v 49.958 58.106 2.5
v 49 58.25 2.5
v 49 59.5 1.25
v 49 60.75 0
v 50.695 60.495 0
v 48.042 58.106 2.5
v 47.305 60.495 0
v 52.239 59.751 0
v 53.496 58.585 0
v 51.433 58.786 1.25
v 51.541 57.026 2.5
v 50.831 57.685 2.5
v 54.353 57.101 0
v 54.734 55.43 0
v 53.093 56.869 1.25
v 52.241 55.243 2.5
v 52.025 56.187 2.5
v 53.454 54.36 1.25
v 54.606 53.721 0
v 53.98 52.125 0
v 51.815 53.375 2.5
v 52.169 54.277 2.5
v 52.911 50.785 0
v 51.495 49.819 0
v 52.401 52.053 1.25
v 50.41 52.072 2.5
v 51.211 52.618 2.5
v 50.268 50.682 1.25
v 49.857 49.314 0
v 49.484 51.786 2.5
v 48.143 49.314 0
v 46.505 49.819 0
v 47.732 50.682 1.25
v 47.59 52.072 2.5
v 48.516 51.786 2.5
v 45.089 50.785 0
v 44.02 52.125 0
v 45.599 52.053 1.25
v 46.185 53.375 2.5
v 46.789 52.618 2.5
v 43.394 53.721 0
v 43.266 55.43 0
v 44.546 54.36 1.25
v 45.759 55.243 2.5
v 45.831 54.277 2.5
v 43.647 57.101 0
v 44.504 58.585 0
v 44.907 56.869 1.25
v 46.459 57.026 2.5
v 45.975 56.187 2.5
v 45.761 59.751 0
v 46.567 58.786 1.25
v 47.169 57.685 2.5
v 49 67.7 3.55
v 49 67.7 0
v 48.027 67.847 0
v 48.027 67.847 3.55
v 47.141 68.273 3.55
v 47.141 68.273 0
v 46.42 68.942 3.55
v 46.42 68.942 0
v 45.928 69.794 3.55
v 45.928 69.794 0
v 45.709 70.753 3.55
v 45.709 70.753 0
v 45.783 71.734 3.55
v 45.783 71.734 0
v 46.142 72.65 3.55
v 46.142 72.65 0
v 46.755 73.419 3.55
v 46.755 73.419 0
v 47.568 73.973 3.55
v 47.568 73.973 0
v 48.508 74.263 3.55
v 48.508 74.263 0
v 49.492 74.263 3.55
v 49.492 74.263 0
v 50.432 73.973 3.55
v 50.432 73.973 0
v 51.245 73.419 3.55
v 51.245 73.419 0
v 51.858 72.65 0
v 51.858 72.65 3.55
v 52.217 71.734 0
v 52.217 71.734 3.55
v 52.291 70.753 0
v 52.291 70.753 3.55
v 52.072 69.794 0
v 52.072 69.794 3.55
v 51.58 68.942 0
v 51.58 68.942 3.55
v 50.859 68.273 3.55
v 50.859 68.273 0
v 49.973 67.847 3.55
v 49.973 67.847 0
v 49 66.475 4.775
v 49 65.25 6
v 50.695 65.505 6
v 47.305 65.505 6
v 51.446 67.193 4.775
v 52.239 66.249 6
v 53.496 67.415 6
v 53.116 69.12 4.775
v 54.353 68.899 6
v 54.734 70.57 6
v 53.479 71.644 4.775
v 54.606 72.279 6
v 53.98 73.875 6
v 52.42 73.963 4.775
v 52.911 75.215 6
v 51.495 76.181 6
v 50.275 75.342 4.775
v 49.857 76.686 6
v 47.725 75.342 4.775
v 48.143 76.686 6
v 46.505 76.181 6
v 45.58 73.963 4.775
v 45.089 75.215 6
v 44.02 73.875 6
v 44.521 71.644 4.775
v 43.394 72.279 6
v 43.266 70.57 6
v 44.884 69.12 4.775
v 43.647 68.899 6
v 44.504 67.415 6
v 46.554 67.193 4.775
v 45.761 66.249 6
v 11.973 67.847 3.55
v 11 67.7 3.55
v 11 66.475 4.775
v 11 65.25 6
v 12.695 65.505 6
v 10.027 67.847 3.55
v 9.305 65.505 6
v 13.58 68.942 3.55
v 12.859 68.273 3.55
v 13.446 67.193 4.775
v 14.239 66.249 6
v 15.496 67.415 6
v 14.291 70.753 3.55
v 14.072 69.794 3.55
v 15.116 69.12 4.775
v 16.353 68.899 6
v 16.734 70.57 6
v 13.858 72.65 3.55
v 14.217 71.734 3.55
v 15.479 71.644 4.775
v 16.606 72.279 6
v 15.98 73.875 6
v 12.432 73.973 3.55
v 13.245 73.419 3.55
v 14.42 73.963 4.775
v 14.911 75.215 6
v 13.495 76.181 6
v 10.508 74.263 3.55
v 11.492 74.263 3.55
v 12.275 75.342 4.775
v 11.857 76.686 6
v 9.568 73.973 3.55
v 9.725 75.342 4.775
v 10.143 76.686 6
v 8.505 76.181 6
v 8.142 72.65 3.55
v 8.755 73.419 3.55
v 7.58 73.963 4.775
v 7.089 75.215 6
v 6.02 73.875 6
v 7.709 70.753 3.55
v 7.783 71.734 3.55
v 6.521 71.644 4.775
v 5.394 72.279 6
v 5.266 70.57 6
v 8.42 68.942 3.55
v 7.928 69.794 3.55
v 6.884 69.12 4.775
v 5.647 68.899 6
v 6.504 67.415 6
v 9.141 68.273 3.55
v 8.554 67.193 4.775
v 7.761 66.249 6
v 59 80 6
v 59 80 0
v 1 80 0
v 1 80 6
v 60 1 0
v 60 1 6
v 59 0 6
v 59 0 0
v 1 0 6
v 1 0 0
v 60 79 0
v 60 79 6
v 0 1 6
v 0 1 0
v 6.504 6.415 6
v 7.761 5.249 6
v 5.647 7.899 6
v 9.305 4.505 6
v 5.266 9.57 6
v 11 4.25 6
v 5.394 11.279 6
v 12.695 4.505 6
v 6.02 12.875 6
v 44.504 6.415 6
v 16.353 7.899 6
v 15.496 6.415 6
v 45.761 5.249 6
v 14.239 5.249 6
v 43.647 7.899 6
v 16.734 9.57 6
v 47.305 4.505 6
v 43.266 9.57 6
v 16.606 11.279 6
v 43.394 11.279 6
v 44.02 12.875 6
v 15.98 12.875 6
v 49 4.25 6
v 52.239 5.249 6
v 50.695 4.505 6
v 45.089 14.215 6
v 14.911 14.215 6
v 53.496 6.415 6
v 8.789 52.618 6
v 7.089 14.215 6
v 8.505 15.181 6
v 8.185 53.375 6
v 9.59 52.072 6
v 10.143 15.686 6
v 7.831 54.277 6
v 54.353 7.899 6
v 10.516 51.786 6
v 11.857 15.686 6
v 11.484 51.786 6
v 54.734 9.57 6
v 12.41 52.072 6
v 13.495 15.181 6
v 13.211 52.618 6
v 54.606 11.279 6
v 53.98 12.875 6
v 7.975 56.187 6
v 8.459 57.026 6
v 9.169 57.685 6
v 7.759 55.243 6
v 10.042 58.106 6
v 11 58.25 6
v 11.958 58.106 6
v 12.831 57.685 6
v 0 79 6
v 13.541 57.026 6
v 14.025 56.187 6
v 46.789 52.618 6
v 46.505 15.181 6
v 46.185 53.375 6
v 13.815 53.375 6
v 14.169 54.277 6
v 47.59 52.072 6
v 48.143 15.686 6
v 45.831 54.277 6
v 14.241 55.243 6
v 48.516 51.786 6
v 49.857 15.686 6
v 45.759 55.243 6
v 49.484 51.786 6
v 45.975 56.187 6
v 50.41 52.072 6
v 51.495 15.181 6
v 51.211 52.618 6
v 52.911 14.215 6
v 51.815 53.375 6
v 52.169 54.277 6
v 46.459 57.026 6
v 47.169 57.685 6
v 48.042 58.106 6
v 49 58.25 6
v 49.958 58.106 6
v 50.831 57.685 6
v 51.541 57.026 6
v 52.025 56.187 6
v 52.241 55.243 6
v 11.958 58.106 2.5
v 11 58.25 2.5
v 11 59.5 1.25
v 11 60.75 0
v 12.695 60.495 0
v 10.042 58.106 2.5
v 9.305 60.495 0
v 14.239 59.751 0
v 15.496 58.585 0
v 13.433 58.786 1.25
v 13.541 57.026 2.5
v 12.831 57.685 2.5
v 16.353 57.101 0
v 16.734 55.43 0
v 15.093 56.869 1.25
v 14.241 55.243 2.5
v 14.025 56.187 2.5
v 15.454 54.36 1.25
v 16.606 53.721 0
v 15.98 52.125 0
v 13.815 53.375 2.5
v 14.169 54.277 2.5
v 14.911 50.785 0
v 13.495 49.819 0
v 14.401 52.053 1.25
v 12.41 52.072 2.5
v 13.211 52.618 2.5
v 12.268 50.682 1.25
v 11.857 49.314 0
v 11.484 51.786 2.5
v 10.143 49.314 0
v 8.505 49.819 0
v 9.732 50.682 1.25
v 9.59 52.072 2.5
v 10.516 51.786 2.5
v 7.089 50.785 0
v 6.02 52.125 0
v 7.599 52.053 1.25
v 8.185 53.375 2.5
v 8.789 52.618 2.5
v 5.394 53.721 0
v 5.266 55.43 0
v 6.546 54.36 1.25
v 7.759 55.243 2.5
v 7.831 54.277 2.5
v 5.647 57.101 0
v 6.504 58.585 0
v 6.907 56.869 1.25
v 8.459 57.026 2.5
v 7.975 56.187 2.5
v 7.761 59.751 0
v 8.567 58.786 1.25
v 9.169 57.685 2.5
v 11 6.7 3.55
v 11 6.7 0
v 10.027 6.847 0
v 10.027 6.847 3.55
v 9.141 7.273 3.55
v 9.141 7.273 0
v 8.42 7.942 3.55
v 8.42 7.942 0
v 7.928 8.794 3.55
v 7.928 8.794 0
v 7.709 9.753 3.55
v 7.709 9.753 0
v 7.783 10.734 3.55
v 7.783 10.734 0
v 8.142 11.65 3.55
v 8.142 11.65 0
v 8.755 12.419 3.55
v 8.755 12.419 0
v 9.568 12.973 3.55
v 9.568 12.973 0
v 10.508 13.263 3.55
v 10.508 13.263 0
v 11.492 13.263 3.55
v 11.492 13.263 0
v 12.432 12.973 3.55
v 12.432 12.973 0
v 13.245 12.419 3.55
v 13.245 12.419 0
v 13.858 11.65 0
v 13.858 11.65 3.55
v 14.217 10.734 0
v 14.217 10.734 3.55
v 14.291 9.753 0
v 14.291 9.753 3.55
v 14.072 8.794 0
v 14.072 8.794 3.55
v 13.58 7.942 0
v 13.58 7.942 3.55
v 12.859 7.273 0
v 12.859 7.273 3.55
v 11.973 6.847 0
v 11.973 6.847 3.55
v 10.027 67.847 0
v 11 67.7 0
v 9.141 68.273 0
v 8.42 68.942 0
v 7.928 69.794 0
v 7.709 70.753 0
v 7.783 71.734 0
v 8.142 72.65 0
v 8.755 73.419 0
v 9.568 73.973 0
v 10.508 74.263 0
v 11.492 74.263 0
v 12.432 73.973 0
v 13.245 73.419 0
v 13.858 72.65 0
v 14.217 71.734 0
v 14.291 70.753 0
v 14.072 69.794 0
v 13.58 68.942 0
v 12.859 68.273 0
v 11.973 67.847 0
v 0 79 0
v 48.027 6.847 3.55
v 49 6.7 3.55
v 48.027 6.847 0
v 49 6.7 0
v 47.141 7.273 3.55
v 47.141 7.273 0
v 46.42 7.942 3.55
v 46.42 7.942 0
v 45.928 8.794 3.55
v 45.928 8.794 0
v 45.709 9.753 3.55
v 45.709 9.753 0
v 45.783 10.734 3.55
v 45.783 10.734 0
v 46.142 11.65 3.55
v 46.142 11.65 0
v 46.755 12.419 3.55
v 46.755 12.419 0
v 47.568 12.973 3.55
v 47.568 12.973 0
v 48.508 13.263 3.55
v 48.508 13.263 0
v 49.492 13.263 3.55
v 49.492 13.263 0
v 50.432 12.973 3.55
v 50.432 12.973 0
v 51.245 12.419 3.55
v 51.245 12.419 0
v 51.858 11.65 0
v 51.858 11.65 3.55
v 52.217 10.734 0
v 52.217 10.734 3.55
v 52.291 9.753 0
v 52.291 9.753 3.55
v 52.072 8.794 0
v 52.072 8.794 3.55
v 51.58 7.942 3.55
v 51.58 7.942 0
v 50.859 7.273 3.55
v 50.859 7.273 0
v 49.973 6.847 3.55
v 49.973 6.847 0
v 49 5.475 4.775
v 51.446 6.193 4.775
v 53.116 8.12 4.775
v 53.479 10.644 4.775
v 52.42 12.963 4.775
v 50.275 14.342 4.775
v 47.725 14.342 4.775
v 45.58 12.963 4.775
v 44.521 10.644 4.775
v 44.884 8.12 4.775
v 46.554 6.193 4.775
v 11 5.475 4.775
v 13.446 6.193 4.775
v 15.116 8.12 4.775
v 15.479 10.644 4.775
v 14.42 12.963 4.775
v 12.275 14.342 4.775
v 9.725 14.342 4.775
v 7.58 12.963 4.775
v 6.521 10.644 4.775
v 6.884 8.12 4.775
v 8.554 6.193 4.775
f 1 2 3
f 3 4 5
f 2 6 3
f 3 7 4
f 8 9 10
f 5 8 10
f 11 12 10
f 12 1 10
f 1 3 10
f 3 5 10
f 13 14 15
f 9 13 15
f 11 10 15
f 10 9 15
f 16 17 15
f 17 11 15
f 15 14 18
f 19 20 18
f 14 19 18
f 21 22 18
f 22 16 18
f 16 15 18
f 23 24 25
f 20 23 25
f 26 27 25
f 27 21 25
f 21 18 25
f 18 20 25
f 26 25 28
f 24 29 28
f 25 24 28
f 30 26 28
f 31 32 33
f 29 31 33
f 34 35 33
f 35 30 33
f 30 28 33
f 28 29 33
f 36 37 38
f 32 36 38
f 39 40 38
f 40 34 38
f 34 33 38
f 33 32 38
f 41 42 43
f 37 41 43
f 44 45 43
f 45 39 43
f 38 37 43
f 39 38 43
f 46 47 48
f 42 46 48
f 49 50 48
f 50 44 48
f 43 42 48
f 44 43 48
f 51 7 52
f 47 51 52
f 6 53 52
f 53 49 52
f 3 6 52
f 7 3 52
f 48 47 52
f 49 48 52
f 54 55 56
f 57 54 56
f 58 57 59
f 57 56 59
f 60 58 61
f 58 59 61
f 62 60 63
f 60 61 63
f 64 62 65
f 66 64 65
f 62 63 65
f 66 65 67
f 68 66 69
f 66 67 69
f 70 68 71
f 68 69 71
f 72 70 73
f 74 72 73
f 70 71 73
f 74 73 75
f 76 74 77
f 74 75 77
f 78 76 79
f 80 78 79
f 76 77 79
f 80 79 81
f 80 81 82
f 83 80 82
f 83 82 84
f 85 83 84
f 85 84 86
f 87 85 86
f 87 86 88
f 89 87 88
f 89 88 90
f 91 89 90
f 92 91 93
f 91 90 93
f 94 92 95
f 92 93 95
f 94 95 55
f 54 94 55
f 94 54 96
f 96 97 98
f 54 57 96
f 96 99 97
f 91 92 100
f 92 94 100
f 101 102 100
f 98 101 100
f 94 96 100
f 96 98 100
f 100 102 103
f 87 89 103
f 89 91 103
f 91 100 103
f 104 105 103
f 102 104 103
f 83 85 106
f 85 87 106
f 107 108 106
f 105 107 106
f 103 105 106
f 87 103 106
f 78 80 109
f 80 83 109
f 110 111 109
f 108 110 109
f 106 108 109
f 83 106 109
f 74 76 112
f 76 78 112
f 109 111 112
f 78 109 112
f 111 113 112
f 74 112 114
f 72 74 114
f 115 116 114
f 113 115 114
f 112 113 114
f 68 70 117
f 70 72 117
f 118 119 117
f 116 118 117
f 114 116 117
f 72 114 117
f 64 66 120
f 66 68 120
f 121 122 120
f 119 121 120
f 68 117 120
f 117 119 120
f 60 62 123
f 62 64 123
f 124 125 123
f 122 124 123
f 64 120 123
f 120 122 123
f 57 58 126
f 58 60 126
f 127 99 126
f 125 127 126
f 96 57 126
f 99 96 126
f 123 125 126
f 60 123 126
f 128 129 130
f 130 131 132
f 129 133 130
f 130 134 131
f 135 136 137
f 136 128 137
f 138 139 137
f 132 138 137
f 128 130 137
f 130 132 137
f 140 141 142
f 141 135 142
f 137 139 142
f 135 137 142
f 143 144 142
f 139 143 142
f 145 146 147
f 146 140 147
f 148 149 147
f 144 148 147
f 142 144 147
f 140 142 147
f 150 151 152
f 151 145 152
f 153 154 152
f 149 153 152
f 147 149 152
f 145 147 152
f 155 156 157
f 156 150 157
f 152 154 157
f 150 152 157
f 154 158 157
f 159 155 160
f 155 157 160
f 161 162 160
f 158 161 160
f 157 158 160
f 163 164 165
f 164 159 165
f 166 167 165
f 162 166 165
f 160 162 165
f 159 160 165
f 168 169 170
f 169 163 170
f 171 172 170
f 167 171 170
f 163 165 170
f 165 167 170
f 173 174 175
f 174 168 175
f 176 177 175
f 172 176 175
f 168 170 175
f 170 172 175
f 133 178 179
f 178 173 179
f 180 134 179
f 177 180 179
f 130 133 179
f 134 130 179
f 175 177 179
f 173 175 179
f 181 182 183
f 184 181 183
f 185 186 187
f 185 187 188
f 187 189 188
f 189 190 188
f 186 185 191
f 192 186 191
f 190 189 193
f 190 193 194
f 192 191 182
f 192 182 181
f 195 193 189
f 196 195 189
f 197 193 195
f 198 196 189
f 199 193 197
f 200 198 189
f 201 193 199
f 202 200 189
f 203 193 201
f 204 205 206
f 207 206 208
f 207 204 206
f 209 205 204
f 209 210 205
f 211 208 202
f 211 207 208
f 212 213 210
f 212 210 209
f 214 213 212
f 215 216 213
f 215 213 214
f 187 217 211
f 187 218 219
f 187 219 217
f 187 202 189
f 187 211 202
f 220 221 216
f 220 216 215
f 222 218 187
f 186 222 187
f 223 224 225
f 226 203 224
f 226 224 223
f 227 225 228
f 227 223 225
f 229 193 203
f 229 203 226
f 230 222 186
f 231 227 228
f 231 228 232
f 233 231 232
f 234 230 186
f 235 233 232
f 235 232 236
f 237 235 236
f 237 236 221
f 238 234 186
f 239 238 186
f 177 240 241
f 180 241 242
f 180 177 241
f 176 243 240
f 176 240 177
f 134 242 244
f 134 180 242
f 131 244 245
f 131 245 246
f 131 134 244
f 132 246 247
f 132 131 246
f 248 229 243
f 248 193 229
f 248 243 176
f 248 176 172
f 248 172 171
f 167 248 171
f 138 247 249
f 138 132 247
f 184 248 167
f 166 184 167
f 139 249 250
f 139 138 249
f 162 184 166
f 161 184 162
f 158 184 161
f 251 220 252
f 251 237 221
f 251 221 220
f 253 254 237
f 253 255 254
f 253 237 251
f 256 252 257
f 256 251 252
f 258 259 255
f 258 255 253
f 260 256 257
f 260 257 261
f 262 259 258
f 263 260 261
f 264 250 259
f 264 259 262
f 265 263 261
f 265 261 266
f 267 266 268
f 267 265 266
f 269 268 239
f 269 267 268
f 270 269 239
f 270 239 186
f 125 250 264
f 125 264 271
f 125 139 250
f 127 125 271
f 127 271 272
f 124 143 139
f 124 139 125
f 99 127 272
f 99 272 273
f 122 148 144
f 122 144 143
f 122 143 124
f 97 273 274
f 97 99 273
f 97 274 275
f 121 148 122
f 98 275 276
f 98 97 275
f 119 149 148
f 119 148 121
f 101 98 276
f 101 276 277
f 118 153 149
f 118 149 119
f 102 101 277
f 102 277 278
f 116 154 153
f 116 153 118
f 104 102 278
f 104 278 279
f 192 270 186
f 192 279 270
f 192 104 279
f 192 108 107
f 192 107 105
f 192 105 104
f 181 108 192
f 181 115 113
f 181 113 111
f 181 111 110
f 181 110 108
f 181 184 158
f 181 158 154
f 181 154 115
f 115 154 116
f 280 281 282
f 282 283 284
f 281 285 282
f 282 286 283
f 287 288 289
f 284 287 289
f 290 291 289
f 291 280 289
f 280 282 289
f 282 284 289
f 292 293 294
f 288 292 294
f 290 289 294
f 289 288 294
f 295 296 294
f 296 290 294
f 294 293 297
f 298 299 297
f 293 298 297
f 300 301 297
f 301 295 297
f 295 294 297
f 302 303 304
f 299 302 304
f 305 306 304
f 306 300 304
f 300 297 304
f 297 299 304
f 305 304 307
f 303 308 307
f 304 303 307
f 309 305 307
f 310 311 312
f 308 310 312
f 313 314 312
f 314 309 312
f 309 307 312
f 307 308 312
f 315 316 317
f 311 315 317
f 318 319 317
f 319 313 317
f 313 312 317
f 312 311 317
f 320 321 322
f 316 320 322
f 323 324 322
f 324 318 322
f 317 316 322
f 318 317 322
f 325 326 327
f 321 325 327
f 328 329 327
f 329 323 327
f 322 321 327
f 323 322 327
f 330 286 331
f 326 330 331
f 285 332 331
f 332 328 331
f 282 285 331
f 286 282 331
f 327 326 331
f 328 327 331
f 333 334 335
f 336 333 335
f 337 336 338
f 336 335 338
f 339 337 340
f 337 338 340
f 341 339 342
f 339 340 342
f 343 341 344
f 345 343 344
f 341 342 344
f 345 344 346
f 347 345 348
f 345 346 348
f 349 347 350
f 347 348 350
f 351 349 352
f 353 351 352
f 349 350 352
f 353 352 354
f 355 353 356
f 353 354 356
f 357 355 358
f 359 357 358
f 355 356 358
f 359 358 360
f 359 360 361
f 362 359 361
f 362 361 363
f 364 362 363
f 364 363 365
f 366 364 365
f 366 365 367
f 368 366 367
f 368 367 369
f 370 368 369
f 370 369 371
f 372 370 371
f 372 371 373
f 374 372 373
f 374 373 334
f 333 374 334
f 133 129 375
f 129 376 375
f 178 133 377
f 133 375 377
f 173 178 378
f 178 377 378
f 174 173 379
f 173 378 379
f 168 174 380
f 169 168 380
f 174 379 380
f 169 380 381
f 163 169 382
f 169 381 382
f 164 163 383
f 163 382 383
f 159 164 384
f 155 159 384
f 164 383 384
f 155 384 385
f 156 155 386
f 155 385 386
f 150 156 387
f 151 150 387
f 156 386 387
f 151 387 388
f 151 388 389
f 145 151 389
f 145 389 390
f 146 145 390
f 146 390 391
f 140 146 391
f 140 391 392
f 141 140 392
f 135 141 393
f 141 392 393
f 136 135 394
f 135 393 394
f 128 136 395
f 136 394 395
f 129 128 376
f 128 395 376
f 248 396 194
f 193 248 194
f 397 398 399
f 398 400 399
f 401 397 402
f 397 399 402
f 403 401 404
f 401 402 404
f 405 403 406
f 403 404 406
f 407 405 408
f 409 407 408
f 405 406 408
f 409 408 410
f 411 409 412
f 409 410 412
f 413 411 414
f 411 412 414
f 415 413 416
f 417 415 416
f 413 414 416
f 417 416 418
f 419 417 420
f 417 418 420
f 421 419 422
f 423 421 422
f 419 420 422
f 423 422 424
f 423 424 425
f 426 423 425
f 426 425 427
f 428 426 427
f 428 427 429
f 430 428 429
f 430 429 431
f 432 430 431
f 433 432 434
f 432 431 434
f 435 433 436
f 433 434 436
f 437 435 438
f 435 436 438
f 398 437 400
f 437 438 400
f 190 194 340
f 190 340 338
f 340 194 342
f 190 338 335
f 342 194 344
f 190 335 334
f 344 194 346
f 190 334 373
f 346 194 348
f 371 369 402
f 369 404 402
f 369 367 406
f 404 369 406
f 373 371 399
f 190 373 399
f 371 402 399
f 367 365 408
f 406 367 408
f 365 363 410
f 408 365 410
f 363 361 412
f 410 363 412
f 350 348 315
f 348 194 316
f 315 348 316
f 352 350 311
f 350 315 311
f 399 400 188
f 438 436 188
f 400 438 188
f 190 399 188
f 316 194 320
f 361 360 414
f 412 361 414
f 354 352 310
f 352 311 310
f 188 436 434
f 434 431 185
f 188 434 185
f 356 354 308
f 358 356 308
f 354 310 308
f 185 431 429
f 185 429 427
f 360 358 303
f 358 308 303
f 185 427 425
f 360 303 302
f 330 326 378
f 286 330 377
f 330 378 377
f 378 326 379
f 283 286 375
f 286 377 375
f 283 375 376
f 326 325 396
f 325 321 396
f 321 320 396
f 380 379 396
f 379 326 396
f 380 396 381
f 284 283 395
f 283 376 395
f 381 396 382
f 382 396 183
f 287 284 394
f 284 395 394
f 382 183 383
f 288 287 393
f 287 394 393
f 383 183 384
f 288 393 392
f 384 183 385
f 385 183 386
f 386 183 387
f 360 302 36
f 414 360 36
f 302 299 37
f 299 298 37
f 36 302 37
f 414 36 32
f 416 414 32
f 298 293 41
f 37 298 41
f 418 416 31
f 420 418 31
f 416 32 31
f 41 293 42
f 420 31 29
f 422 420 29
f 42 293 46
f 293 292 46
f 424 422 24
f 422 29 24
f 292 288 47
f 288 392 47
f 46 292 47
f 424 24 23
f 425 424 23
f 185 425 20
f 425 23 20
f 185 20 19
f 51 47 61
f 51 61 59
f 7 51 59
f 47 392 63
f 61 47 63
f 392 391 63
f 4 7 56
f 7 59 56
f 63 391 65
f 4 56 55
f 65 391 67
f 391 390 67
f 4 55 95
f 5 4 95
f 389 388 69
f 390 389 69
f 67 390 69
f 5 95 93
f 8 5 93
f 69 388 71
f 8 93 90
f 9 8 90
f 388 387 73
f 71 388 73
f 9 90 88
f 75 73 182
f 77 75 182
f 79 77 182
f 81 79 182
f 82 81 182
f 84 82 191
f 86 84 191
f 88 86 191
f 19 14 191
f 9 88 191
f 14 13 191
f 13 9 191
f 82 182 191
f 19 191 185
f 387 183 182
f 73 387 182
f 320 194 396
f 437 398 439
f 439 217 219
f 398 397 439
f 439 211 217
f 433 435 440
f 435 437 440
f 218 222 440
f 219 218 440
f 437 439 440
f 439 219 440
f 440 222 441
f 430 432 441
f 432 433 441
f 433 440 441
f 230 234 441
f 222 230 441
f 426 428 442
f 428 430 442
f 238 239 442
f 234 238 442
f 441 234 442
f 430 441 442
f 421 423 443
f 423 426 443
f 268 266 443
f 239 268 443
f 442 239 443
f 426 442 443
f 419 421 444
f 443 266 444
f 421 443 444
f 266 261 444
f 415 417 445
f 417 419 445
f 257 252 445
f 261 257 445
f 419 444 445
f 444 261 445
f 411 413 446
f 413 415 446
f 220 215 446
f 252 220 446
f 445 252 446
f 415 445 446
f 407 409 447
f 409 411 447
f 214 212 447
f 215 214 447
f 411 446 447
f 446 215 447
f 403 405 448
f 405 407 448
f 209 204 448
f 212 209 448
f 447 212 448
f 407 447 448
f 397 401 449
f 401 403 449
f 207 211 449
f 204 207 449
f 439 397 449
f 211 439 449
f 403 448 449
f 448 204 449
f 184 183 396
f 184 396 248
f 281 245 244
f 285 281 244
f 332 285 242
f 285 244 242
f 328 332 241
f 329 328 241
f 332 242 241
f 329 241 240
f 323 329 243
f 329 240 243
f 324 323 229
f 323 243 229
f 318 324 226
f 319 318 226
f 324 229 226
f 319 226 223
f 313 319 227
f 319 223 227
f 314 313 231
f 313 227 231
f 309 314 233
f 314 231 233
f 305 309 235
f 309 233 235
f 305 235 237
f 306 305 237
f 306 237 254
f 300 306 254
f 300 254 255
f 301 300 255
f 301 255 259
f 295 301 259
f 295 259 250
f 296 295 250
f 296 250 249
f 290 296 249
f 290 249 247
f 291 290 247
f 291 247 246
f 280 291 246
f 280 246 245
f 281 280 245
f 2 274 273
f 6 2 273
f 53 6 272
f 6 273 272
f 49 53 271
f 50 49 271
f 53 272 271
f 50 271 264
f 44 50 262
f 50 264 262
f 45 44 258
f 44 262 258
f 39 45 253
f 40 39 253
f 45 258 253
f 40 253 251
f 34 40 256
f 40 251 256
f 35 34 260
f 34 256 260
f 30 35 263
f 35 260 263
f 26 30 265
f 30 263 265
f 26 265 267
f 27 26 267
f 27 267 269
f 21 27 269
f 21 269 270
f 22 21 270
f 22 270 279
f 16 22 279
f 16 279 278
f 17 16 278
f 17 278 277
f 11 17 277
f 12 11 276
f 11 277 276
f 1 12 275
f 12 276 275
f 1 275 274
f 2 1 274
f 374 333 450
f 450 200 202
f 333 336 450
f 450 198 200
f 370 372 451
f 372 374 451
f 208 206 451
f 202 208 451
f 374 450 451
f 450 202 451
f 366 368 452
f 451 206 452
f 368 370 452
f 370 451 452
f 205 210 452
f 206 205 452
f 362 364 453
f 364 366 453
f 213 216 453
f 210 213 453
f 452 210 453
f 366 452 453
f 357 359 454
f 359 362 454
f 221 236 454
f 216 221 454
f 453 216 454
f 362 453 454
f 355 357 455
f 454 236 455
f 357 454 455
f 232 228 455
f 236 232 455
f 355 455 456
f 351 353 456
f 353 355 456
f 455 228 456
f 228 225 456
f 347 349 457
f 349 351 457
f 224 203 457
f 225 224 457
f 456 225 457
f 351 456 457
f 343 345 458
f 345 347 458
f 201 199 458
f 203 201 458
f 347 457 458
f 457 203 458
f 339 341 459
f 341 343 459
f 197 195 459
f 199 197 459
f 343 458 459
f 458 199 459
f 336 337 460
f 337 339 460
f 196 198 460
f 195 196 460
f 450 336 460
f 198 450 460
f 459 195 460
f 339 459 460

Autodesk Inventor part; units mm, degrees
ref_plane "YZ Plane" through (0, 0, 0) normal (1, 0, 0) x (0, 1, 0)
ref_plane "XZ Plane" through (0, 0, 0) normal (0, 1, 0) x (-1, 0, 0)
ref_plane "XY Plane" through (0, 0, 0) normal (0, 0, 1) x (1, 0, 0)
sketch "Sketch1" plane through (0, 0, 0) normal (0, 0, 1) x (1, 0, 0)
  line L0 (0, 0) -> (60, 0)
  line L1 (60, 0) -> (60, 80)
  line L2 (60, 80) -> (0, 80)
  line L3 (0, 80) -> (0, 0)
  dimension "d0" = 80
  dimension "d1" = 60
extrude "Extrusion1" add sketch "Sketch1" along normal blind 6
sketch "Sketch2" plane through (0, 0, 6) normal (0, 0, 1) x (1, 0, 0)
  line L0 (0, 0) -> (0, 80) projected
  line L1 (60, 0) -> (0, 0) projected
  point P0 (11, 71)
  point P1 (49, 71)
  point P2 (11, 10)
  point P3 (49, 10)
  dimension "d4" = 11
  dimension "d5" = 49
  dimension "d6" = 10
  dimension "d7" = 11
  dimension "d8" = 49
  dimension "d13" = 71
  dimension "d14" = 71
  dimension "d15" = 10
hole "Hole1" at (11, 71, 6) at (49, 71, 6) at (11, 10, 6) at (49, 10, 6) direction (0, 0, -1) diameter 6.6 depth 6 tip angle 118 countersink diameter 11.5 countersink angle 90
sketch "Sketch3" plane through (0, 0, 0) normal (0, 0, -1) x (-1, 0, 0)
  line L0 (0, 0) -> (-60, 0) projected
  line L1 (-60, 0) -> (-60, 80) projected
  point P0 (-49, 55)
  point P1 (-11, 55)
  dimension "d26" = 55
  dimension "d27" = 55
  dimension "d28" = 11
  dimension "d29" = 49
hole "Hole2" at (49, 55, 0) at (11, 55, 0) direction (0, 0, 1) diameter 6.5 depth 6 tip angle 118 countersink diameter 11.5 countersink angle 90
chamfer "Chamfer2" distance 1 angle 45 4 edges at (60, 0, 3) (60, 80, 3) (0, 80, 3) (0, 0, 3)
properties part number "TRASEIRA DA CABINE" material "Carbon Steel"
